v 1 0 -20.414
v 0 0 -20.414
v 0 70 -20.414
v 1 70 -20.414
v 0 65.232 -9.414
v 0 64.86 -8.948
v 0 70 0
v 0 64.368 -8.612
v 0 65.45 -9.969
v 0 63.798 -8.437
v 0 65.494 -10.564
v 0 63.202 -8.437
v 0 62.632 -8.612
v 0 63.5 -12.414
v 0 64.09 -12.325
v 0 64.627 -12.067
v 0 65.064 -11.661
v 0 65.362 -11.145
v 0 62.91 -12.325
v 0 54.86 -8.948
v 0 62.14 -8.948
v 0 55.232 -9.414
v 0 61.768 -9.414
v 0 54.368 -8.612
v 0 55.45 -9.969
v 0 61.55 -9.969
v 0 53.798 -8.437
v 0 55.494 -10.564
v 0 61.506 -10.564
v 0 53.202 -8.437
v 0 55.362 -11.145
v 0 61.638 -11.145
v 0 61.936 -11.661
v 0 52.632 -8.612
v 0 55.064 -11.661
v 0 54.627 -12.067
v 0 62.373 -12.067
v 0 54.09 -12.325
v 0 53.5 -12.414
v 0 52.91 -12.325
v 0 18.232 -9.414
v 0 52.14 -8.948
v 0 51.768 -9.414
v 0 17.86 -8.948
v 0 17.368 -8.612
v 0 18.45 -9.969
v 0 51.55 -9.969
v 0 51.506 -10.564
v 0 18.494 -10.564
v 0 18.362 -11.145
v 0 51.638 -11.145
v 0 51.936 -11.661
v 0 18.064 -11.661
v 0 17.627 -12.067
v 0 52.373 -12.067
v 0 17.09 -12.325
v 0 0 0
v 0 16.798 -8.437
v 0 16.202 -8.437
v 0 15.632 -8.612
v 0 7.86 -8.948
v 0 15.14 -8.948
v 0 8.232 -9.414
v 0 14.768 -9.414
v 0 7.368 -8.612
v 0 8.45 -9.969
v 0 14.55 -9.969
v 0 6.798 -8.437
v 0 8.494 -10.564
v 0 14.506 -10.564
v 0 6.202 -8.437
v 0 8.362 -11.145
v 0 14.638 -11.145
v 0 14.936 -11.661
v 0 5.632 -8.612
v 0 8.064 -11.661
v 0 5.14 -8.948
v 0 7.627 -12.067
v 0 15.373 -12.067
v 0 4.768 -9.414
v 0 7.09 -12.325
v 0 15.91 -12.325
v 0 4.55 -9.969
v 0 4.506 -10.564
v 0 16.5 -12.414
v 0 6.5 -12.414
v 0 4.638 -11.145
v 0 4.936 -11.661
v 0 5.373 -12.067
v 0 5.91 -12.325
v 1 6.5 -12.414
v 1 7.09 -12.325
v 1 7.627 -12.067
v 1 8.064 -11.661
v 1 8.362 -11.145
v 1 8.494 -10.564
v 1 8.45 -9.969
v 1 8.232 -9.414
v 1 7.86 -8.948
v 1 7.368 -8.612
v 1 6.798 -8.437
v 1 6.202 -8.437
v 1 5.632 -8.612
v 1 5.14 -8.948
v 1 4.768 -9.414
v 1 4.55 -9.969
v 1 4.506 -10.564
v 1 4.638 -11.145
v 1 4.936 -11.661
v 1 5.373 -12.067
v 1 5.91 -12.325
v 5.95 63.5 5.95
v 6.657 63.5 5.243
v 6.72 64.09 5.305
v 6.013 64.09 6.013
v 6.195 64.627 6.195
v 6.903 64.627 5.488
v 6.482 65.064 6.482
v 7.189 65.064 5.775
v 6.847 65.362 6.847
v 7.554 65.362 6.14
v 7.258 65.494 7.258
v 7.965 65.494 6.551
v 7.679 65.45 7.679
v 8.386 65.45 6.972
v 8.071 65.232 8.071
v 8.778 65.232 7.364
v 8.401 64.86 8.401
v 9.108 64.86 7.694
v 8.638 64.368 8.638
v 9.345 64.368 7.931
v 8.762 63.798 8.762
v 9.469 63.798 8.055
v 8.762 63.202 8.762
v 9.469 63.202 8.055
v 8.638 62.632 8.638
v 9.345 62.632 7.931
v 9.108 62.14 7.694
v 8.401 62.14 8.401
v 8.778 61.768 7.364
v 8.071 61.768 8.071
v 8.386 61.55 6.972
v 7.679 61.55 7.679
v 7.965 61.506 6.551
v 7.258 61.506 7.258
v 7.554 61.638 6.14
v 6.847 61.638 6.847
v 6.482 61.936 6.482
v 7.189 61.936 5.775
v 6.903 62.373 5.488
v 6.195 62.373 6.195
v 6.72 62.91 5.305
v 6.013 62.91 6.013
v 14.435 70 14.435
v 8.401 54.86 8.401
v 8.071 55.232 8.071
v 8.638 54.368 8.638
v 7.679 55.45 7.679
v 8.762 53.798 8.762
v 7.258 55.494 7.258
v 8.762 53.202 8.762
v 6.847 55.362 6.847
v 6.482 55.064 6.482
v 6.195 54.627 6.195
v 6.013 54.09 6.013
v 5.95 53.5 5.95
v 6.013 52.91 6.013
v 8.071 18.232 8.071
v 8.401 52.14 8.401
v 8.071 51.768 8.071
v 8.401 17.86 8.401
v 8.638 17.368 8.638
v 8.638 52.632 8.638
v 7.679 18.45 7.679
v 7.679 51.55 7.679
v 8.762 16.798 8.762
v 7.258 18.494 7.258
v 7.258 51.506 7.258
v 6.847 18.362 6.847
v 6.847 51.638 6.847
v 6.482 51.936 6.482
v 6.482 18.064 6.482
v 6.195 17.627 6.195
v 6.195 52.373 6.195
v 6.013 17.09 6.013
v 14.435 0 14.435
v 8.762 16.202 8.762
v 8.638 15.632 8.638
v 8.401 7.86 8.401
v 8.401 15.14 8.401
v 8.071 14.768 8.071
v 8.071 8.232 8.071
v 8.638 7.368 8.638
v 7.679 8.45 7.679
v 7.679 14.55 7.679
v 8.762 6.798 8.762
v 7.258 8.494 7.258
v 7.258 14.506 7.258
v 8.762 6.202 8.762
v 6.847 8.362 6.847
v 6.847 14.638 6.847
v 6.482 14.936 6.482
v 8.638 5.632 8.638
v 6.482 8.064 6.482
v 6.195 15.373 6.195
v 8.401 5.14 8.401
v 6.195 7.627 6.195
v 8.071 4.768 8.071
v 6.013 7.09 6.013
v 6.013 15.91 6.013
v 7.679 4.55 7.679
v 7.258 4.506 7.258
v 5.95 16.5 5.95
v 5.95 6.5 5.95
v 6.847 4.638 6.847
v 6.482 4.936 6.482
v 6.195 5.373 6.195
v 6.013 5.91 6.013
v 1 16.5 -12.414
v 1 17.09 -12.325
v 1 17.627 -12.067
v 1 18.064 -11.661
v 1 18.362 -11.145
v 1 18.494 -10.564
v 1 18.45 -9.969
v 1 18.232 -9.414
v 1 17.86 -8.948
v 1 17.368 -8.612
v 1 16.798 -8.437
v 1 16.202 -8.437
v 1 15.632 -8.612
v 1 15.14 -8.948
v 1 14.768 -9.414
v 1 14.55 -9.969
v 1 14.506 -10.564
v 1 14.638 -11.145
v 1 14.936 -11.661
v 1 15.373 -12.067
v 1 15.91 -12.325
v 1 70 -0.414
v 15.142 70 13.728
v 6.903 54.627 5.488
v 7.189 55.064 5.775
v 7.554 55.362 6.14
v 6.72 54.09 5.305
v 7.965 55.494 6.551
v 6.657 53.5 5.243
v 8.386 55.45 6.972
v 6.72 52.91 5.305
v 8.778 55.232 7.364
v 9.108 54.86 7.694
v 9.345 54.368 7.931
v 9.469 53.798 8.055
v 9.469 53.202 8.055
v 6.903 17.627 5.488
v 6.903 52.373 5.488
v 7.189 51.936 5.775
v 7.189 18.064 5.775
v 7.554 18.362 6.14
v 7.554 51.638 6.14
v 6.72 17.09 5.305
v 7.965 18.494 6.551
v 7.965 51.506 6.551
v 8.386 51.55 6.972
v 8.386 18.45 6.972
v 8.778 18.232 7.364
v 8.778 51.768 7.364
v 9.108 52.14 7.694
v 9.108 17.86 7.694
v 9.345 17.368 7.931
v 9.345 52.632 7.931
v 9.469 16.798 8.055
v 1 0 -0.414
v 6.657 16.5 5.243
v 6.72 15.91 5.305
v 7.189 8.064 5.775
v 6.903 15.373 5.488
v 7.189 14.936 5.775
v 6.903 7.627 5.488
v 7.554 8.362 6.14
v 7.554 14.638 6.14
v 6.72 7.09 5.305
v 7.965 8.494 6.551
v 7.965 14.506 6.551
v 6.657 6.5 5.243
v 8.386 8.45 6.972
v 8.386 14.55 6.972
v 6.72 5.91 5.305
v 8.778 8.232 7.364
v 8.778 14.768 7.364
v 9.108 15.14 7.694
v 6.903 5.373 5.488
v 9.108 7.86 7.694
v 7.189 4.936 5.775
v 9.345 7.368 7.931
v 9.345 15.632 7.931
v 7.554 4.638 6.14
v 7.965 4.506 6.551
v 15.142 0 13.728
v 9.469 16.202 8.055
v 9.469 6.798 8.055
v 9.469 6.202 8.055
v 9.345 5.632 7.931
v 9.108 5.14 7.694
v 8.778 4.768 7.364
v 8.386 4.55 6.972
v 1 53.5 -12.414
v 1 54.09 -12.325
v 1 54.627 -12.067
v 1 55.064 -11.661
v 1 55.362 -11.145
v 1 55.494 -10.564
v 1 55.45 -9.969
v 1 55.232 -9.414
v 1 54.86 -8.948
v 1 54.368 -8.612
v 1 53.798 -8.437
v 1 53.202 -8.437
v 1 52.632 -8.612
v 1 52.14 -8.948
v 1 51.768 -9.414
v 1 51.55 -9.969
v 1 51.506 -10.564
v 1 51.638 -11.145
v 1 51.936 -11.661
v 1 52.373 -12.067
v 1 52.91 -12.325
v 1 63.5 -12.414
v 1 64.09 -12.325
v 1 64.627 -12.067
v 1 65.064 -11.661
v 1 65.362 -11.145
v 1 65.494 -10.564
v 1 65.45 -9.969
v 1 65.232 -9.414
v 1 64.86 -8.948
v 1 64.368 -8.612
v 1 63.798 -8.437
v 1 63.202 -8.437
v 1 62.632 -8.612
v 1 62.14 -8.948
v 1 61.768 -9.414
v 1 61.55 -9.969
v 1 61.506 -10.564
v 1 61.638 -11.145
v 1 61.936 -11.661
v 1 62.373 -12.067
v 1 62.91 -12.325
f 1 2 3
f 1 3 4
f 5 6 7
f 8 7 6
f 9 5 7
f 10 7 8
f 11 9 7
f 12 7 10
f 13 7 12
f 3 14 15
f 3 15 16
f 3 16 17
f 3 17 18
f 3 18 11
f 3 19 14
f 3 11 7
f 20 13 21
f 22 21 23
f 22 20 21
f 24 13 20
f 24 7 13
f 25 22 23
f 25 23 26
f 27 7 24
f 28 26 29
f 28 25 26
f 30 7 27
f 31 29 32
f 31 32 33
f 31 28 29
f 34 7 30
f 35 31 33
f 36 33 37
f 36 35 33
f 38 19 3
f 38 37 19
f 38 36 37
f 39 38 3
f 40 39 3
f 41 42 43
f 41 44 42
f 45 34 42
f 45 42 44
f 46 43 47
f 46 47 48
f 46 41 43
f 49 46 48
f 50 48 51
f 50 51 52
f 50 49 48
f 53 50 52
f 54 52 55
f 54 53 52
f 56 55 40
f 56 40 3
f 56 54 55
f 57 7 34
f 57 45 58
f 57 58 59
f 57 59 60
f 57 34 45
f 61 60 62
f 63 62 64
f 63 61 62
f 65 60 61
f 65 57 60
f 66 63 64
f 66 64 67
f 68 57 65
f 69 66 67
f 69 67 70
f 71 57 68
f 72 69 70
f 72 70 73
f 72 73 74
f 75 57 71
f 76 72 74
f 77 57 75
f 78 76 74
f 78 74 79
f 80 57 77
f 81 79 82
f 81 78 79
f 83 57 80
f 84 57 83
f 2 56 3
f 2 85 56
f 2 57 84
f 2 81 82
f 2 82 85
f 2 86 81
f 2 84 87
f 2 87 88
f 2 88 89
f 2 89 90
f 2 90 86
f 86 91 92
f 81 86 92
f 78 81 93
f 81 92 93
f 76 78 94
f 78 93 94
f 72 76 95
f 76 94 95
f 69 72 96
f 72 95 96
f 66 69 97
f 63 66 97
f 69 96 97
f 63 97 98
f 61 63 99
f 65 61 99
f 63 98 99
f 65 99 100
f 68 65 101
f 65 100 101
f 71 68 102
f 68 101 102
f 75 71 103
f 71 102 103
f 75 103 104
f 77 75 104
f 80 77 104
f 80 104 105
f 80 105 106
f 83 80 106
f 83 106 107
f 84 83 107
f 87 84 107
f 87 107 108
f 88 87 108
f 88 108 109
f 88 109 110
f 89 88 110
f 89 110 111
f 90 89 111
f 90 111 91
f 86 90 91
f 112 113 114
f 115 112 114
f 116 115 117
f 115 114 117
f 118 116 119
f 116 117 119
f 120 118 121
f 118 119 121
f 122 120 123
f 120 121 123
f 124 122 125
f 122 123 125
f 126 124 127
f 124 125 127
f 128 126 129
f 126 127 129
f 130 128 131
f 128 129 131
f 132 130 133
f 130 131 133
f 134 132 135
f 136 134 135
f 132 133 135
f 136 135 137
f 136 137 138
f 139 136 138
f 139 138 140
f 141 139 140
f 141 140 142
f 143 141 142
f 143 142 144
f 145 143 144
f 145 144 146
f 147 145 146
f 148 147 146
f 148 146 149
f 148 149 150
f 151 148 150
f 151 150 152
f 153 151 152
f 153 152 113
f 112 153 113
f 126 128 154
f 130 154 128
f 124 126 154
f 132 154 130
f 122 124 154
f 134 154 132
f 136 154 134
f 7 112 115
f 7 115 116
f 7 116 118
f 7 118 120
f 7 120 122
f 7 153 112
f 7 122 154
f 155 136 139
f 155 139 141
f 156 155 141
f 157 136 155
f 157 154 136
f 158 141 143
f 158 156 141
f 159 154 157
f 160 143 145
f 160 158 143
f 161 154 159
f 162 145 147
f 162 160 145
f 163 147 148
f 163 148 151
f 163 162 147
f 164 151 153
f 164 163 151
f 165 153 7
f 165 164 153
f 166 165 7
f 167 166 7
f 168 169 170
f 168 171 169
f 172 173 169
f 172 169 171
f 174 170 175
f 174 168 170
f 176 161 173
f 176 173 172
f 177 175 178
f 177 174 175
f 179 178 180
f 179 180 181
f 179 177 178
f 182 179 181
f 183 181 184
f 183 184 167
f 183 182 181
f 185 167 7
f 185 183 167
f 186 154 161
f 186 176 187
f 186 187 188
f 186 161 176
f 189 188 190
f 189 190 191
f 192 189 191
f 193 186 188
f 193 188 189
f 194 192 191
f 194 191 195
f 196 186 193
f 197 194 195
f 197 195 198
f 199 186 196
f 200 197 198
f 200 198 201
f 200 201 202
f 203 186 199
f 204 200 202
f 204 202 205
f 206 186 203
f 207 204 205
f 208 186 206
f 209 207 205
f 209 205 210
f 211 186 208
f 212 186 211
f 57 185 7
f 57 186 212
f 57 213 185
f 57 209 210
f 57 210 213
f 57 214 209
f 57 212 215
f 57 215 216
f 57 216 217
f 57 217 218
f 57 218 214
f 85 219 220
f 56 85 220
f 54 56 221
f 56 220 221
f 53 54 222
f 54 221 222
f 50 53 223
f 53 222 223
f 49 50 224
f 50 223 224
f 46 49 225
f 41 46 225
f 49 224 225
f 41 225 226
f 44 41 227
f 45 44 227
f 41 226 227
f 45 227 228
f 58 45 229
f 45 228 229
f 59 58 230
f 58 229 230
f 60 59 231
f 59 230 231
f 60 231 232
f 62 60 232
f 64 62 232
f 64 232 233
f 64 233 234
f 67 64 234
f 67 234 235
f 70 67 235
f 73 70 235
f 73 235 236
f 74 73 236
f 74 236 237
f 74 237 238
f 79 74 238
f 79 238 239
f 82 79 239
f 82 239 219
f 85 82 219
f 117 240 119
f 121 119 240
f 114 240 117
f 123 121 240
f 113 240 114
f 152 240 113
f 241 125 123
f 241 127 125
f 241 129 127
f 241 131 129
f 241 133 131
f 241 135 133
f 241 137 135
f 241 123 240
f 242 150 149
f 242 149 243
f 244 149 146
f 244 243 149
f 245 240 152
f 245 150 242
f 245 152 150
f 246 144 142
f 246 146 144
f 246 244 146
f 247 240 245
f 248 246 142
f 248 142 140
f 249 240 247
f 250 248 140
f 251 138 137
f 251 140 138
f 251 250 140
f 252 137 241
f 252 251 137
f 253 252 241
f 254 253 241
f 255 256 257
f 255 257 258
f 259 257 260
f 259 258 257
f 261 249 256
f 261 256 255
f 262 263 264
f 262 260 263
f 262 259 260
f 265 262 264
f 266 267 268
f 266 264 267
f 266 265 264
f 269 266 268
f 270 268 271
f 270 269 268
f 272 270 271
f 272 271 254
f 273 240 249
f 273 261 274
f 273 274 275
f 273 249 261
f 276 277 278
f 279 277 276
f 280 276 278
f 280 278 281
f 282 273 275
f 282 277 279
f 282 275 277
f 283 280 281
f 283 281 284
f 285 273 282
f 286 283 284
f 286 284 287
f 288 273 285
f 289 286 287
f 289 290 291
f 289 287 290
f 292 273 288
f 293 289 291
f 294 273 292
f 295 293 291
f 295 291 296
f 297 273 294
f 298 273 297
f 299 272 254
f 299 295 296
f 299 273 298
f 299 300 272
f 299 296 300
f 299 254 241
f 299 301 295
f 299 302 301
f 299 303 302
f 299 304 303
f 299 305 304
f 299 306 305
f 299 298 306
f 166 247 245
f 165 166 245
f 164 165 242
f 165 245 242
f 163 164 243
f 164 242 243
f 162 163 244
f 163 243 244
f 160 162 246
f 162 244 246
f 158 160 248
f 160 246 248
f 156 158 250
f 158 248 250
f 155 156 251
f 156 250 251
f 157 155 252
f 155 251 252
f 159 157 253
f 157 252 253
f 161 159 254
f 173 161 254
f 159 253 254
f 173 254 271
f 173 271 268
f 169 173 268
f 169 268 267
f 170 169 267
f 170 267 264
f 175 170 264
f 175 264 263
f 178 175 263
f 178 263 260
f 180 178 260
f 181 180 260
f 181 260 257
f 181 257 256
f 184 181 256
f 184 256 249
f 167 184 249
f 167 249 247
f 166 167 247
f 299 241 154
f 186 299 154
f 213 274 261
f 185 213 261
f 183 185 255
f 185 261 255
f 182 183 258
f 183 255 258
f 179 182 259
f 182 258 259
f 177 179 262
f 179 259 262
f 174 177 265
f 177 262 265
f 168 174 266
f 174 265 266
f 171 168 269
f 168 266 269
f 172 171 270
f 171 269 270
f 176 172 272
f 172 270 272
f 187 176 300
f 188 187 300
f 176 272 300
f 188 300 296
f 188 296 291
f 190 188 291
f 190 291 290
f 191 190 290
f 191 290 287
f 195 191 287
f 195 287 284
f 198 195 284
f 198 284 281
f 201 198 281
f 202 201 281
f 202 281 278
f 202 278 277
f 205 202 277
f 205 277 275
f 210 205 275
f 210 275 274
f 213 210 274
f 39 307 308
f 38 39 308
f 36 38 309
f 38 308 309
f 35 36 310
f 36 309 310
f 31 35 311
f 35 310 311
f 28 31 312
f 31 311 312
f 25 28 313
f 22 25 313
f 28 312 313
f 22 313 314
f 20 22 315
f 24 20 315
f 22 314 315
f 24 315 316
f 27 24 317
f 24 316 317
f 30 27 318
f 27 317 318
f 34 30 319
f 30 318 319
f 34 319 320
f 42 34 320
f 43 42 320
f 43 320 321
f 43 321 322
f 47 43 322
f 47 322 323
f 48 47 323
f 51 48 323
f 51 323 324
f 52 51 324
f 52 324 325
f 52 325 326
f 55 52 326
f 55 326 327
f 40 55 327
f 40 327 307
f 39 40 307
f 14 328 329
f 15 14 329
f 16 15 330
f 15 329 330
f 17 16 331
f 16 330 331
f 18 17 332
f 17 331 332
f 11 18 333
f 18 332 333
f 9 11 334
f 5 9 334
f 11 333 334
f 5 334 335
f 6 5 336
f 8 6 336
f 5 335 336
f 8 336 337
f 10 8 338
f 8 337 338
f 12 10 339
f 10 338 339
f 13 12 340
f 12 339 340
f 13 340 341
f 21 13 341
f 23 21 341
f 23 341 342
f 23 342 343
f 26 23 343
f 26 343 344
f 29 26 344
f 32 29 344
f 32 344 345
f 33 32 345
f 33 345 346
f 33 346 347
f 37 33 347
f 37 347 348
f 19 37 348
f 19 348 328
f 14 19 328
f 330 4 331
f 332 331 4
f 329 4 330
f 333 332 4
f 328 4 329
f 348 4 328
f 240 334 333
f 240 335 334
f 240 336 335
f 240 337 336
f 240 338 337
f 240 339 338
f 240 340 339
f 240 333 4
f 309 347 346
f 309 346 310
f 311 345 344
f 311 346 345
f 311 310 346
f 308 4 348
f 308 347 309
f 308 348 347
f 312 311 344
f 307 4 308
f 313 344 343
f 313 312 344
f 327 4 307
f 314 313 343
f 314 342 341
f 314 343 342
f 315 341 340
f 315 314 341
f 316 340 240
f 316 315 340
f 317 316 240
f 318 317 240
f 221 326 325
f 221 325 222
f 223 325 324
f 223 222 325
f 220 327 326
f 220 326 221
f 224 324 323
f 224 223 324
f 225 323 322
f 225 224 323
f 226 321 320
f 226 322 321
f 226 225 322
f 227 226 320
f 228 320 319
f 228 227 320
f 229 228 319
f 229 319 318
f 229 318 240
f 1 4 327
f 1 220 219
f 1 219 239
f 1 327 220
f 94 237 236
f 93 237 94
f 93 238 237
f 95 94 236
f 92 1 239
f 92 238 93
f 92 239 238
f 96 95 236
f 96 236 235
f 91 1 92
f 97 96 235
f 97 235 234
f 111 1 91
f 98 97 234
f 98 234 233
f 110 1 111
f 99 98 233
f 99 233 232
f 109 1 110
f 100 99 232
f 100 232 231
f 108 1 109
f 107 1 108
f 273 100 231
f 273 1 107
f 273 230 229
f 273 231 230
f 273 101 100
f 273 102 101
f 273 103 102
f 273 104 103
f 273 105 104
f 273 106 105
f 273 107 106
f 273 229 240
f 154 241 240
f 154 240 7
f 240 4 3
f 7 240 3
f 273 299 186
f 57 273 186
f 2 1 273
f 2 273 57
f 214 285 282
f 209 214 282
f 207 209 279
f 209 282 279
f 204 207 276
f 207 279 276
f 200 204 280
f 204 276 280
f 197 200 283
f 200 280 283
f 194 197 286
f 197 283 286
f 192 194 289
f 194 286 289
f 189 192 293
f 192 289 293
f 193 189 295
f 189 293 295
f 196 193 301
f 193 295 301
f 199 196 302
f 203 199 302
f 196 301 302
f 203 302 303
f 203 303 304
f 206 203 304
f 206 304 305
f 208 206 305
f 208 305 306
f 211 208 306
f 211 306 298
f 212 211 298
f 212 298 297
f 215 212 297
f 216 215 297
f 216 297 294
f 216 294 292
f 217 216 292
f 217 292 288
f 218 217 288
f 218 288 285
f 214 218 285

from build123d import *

# Parameters (mm, degrees)
EXTRUSION1_DEPTH = 70
EXTRUSION2_REACH = 3
ESQUISSE2_R      = 2
EXTRUSION3_REACH = 13.207
ESQUISSE3_R      = 2


with BuildPart() as part:
    # Esquisse1 → Extrusion1 (new body)
    with BuildSketch(Plane(origin=(0, 0, 0), x_dir=(1, 0, 0), z_dir=(0, 1, 0))):
        Polygon((0, 0), (0, 20.414213562), (1, 20.414213562), (1, 0.414213562), (15.142135624, -13.727922061), (14.435028843, -14.435028843), align=None)
    extrude(amount=EXTRUSION1_DEPTH)

    # Esquisse2 → Extrusion2 (cut, up to next)
    with BuildSketch(Plane(origin=(1, 0, 0), x_dir=(0, 0, -1), z_dir=(1, 0, 0)), mode=Mode.PRIVATE) as extrusion2_sk1:
        with Locations((10.414213562, 16.5)):
            Circle(ESQUISSE2_R)
    extrusion2_tool1 = extrude(extrusion2_sk1.sketch, amount=-EXTRUSION2_REACH, mode=Mode.PRIVATE) & part.part
    add(extrusion2_tool1.solids().sort_by_distance((1, 16.5, -10.414214))[0], mode=Mode.SUBTRACT)
    # Esquisse2 → Extrusion2 (cut, up to next)
    with BuildSketch(Plane(origin=(1, 0, 0), x_dir=(0, 0, -1), z_dir=(1, 0, 0)), mode=Mode.PRIVATE) as extrusion2_sk2:
        with Locations((10.414213562, 6.5)):
            Circle(ESQUISSE2_R)
    extrusion2_tool2 = extrude(extrusion2_sk2.sketch, amount=-EXTRUSION2_REACH, mode=Mode.PRIVATE) & part.part
    add(extrusion2_tool2.solids().sort_by_distance((1, 6.5, -10.414214))[0], mode=Mode.SUBTRACT)
    # Esquisse2 → Extrusion2 (cut, up to next)
    with BuildSketch(Plane(origin=(1, 0, 0), x_dir=(0, 0, -1), z_dir=(1, 0, 0)), mode=Mode.PRIVATE) as extrusion2_sk3:
        with Locations((10.414213562, 53.5)):
            Circle(ESQUISSE2_R)
    extrusion2_tool3 = extrude(extrusion2_sk3.sketch, amount=-EXTRUSION2_REACH, mode=Mode.PRIVATE) & part.part
    add(extrusion2_tool3.solids().sort_by_distance((1, 53.5, -10.414214))[0], mode=Mode.SUBTRACT)
    # Esquisse2 → Extrusion2 (cut, up to next)
    with BuildSketch(Plane(origin=(1, 0, 0), x_dir=(0, 0, -1), z_dir=(1, 0, 0)), mode=Mode.PRIVATE) as extrusion2_sk4:
        with Locations((10.414213562, 63.5)):
            Circle(ESQUISSE2_R)
    extrusion2_tool4 = extrude(extrusion2_sk4.sketch, amount=-EXTRUSION2_REACH, mode=Mode.PRIVATE) & part.part
    add(extrusion2_tool4.solids().sort_by_distance((1, 63.5, -10.414214))[0], mode=Mode.SUBTRACT)

    # Esquisse3 → Extrusion3 (cut, up to next)
    with BuildSketch(Plane(origin=(0.707106781, 0, -0.707106781), x_dir=(-0.707106781, 0, -0.707106781), z_dir=(0.707106781, 0, -0.707106781)), mode=Mode.PRIVATE) as extrusion3_sk1:
        with Locations((-10.414213562, 53.5)):
            Circle(ESQUISSE3_R)
    extrusion3_tool1 = extrude(extrusion3_sk1.sketch, amount=-EXTRUSION3_REACH, mode=Mode.PRIVATE) & part.part
    add(extrusion3_tool1.solids().sort_by_distance((8.071068, 53.5, 6.656854))[0], mode=Mode.SUBTRACT)
    # Esquisse3 → Extrusion3 (cut, up to next)
    with BuildSketch(Plane(origin=(0.707106781, 0, -0.707106781), x_dir=(-0.707106781, 0, -0.707106781), z_dir=(0.707106781, 0, -0.707106781)), mode=Mode.PRIVATE) as extrusion3_sk2:
        with Locations((-10.414213562, 63.5)):
            Circle(ESQUISSE3_R)
    extrusion3_tool2 = extrude(extrusion3_sk2.sketch, amount=-EXTRUSION3_REACH, mode=Mode.PRIVATE) & part.part
    add(extrusion3_tool2.solids().sort_by_distance((8.071068, 63.5, 6.656854))[0], mode=Mode.SUBTRACT)
    # Esquisse3 → Extrusion3 (cut, up to next)
    with BuildSketch(Plane(origin=(0.707106781, 0, -0.707106781), x_dir=(-0.707106781, 0, -0.707106781), z_dir=(0.707106781, 0, -0.707106781)), mode=Mode.PRIVATE) as extrusion3_sk3:
        with Locations((-10.414213562, 6.5)):
            Circle(ESQUISSE3_R)
    extrusion3_tool3 = extrude(extrusion3_sk3.sketch, amount=-EXTRUSION3_REACH, mode=Mode.PRIVATE) & part.part
    add(extrusion3_tool3.solids().sort_by_distance((8.071068, 6.5, 6.656854))[0], mode=Mode.SUBTRACT)
    # Esquisse3 → Extrusion3 (cut, up to next)
    with BuildSketch(Plane(origin=(0.707106781, 0, -0.707106781), x_dir=(-0.707106781, 0, -0.707106781), z_dir=(0.707106781, 0, -0.707106781)), mode=Mode.PRIVATE) as extrusion3_sk4:
        with Locations((-10.414213562, 16.5)):
            Circle(ESQUISSE3_R)
    extrusion3_tool4 = extrude(extrusion3_sk4.sketch, amount=-EXTRUSION3_REACH, mode=Mode.PRIVATE) & part.part
    add(extrusion3_tool4.solids().sort_by_distance((8.071068, 16.5, 6.656854))[0], mode=Mode.SUBTRACT)


solid = part.part
